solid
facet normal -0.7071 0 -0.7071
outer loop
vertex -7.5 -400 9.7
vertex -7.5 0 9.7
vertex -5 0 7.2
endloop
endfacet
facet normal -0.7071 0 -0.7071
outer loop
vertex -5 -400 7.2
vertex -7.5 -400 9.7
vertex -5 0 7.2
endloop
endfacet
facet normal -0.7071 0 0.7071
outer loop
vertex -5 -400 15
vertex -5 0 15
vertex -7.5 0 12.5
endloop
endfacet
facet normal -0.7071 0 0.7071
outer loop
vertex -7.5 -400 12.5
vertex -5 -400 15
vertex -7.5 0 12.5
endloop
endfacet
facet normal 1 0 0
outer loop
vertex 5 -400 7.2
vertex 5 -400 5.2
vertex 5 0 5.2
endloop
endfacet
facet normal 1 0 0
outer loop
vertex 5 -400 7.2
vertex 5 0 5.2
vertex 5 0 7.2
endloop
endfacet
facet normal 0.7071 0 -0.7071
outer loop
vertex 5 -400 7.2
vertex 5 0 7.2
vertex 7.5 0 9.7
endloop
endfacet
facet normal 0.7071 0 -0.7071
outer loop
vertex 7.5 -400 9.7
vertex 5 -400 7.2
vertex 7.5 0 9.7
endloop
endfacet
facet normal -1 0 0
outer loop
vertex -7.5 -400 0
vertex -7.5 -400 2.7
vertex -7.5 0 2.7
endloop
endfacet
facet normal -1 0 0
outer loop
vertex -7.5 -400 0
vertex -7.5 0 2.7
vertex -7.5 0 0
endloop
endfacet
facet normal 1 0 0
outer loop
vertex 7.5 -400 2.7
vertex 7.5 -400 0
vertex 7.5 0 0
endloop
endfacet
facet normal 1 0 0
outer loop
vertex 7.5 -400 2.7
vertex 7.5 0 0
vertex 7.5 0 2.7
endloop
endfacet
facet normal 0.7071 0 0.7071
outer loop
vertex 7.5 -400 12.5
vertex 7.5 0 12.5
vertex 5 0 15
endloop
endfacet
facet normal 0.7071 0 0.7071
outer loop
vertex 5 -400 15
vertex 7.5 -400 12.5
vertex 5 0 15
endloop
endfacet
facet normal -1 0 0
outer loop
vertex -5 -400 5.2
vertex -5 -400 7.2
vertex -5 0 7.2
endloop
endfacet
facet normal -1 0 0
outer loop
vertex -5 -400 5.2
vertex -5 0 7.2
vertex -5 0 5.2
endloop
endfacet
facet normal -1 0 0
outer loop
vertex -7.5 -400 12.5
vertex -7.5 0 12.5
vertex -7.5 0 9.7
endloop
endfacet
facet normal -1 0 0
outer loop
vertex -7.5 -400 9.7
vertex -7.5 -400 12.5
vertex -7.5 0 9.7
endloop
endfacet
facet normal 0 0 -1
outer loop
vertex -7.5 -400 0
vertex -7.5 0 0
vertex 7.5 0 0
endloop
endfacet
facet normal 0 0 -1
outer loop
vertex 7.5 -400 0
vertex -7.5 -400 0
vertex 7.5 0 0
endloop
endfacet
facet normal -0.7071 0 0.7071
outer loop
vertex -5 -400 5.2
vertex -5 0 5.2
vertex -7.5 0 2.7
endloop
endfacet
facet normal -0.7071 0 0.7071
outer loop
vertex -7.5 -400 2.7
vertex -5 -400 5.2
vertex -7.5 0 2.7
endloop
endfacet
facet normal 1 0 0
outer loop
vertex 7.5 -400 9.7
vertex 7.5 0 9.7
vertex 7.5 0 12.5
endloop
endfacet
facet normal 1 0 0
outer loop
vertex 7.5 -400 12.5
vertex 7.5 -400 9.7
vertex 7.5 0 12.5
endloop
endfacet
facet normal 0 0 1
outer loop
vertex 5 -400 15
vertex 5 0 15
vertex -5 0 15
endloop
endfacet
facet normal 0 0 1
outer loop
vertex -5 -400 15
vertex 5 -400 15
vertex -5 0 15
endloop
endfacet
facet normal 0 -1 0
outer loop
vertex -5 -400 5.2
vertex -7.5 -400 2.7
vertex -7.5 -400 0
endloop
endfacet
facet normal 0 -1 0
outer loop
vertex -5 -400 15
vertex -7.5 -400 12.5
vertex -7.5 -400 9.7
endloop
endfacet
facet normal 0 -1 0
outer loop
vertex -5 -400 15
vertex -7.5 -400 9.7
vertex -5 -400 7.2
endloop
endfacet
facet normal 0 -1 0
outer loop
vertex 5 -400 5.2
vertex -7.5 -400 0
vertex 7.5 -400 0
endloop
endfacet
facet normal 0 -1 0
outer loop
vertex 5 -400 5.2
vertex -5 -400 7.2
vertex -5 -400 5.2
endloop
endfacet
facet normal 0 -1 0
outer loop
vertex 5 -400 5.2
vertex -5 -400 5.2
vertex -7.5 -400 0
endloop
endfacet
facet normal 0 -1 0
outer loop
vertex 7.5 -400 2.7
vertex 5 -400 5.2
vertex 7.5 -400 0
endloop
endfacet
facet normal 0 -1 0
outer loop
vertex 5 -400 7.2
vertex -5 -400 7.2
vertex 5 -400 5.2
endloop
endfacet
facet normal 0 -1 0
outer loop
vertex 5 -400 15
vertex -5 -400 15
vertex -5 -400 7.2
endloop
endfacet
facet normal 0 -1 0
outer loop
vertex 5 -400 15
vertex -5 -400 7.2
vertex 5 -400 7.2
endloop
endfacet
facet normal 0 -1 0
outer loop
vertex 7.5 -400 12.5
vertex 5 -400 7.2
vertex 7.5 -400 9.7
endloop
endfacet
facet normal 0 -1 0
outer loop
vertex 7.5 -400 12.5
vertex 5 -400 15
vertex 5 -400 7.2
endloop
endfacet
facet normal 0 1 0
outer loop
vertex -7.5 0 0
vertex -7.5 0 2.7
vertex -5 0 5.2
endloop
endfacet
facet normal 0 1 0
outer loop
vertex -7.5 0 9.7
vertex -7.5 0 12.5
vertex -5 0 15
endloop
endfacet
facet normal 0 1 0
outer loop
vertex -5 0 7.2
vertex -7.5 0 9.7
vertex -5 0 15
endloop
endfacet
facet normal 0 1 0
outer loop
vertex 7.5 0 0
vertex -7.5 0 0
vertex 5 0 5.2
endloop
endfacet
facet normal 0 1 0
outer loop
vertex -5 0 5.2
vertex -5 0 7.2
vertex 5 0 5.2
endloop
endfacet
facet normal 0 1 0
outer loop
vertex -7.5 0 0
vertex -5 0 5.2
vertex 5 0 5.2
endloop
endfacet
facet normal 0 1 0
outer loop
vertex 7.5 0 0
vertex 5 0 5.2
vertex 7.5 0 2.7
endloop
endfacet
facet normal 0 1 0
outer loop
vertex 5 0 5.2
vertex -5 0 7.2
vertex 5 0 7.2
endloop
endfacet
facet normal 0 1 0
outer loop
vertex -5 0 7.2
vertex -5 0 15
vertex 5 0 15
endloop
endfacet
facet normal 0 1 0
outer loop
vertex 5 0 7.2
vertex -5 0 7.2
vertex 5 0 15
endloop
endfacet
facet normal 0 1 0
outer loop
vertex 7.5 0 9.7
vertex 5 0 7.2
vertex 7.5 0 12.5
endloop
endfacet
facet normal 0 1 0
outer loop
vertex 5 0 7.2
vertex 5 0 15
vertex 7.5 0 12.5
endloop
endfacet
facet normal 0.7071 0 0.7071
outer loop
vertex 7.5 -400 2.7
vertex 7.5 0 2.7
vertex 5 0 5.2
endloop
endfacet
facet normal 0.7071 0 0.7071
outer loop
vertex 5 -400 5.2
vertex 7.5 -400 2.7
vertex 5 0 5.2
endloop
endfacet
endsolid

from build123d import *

# Parameters (mm, degrees)
PAD_DEPTH = 400


with BuildPart() as part:
    # Sketch → Pad (new body)
    with BuildSketch(Plane.XZ):
        Polygon((-7.5, 0), (7.5, 0), (7.5, 2.7), (5, 5.2), (5, 7.2), (7.5, 9.7), (7.5, 12.5), (5, 15), (-5, 15), (-7.5, 12.5), (-7.5, 9.7), (-5, 7.2), (-5, 5.2), (-7.5, 2.7), align=None)
    extrude(amount=PAD_DEPTH)


solid = part.part
